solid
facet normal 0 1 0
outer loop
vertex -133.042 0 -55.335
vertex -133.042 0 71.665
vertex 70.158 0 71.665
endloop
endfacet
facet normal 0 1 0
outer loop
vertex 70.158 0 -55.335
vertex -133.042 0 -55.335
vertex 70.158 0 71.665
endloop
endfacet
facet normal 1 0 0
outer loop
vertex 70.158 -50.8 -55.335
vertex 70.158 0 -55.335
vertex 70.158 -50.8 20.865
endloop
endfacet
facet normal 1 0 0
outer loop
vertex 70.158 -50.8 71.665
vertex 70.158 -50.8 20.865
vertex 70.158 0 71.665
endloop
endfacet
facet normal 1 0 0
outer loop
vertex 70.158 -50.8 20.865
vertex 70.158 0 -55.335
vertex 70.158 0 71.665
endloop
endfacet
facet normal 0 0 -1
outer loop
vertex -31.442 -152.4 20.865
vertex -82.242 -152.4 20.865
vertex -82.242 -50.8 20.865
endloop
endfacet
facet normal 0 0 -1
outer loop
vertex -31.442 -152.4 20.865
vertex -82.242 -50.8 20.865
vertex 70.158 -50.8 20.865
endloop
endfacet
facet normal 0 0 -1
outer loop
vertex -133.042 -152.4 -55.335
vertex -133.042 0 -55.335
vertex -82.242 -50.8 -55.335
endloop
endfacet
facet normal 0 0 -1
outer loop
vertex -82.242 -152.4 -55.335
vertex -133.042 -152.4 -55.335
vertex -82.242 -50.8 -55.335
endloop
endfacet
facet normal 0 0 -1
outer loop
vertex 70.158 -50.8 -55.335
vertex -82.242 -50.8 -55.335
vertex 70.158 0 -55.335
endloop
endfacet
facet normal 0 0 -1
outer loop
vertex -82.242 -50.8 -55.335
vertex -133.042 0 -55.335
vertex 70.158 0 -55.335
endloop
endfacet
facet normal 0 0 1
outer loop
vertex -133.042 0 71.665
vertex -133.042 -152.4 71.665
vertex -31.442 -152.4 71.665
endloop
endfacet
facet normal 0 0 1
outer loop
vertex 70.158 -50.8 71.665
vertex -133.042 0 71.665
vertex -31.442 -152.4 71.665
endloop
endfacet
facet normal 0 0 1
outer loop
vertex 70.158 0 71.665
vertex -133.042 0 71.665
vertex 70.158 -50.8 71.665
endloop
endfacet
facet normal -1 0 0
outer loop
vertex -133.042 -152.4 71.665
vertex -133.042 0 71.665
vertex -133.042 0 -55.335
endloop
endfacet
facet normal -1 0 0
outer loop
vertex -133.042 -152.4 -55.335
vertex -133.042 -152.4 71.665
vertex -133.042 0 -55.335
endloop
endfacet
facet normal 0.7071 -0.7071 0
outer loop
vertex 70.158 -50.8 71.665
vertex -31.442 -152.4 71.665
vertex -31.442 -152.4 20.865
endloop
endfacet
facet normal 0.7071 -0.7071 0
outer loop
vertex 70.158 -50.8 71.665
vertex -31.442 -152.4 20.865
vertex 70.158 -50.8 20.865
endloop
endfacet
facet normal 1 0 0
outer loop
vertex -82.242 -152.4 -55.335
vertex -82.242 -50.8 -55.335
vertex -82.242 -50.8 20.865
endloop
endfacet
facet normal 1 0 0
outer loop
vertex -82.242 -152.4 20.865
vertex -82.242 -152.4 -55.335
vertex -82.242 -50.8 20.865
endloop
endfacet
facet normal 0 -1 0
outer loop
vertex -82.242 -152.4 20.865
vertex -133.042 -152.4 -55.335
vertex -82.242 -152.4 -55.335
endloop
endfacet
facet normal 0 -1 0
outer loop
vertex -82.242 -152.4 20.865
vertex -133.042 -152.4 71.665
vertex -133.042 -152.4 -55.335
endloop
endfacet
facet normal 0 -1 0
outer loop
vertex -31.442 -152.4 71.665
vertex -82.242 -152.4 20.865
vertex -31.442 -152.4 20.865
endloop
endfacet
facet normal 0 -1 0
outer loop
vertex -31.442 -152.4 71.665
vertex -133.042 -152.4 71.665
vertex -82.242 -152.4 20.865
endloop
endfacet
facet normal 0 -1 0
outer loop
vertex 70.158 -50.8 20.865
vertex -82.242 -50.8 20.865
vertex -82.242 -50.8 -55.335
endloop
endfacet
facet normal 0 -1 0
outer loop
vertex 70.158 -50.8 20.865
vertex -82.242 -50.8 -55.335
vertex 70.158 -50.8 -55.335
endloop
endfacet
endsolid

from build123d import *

# Parameters (mm, degrees)
F0_W     = 203.2
F0_H     = 127
F1_DEPTH = 50.8
F2_W     = 50.8
F2_H     = 76.2
F2_H_2   = 50.8
F3_DEPTH = 101.6
F5_DEPTH = 50.8


with BuildPart() as f1:
    # F0 (on Front) → F1 (new body)
    with BuildSketch(Plane.XZ):
        with Locations((-31.441638, 8.165119)):
            Rectangle(F0_W, F0_H)
    extrude(amount=F1_DEPTH)

    # F2 (on face) → F3 (join)
    with BuildSketch(Plane.XZ.offset(50.8)):
        with Locations((-107.641638, -17.234881)):
            Rectangle(F2_W, F2_H)
        with Locations((-107.641638, 46.265119)):
            Rectangle(F2_W, F2_H_2)
        with Locations((-56.841638, 46.265119)):
            Rectangle(F2_W, F2_H_2)
    extrude(amount=F3_DEPTH)

    # F4 (on face) → F5 (join)
    with BuildSketch(Plane.XY.offset(71.665119)):
        Polygon((-31.441638, -50.8), (-31.441638, -152.4), (70.158362, -50.8), align=None)
    extrude(amount=-F5_DEPTH)


solid = f1.part
